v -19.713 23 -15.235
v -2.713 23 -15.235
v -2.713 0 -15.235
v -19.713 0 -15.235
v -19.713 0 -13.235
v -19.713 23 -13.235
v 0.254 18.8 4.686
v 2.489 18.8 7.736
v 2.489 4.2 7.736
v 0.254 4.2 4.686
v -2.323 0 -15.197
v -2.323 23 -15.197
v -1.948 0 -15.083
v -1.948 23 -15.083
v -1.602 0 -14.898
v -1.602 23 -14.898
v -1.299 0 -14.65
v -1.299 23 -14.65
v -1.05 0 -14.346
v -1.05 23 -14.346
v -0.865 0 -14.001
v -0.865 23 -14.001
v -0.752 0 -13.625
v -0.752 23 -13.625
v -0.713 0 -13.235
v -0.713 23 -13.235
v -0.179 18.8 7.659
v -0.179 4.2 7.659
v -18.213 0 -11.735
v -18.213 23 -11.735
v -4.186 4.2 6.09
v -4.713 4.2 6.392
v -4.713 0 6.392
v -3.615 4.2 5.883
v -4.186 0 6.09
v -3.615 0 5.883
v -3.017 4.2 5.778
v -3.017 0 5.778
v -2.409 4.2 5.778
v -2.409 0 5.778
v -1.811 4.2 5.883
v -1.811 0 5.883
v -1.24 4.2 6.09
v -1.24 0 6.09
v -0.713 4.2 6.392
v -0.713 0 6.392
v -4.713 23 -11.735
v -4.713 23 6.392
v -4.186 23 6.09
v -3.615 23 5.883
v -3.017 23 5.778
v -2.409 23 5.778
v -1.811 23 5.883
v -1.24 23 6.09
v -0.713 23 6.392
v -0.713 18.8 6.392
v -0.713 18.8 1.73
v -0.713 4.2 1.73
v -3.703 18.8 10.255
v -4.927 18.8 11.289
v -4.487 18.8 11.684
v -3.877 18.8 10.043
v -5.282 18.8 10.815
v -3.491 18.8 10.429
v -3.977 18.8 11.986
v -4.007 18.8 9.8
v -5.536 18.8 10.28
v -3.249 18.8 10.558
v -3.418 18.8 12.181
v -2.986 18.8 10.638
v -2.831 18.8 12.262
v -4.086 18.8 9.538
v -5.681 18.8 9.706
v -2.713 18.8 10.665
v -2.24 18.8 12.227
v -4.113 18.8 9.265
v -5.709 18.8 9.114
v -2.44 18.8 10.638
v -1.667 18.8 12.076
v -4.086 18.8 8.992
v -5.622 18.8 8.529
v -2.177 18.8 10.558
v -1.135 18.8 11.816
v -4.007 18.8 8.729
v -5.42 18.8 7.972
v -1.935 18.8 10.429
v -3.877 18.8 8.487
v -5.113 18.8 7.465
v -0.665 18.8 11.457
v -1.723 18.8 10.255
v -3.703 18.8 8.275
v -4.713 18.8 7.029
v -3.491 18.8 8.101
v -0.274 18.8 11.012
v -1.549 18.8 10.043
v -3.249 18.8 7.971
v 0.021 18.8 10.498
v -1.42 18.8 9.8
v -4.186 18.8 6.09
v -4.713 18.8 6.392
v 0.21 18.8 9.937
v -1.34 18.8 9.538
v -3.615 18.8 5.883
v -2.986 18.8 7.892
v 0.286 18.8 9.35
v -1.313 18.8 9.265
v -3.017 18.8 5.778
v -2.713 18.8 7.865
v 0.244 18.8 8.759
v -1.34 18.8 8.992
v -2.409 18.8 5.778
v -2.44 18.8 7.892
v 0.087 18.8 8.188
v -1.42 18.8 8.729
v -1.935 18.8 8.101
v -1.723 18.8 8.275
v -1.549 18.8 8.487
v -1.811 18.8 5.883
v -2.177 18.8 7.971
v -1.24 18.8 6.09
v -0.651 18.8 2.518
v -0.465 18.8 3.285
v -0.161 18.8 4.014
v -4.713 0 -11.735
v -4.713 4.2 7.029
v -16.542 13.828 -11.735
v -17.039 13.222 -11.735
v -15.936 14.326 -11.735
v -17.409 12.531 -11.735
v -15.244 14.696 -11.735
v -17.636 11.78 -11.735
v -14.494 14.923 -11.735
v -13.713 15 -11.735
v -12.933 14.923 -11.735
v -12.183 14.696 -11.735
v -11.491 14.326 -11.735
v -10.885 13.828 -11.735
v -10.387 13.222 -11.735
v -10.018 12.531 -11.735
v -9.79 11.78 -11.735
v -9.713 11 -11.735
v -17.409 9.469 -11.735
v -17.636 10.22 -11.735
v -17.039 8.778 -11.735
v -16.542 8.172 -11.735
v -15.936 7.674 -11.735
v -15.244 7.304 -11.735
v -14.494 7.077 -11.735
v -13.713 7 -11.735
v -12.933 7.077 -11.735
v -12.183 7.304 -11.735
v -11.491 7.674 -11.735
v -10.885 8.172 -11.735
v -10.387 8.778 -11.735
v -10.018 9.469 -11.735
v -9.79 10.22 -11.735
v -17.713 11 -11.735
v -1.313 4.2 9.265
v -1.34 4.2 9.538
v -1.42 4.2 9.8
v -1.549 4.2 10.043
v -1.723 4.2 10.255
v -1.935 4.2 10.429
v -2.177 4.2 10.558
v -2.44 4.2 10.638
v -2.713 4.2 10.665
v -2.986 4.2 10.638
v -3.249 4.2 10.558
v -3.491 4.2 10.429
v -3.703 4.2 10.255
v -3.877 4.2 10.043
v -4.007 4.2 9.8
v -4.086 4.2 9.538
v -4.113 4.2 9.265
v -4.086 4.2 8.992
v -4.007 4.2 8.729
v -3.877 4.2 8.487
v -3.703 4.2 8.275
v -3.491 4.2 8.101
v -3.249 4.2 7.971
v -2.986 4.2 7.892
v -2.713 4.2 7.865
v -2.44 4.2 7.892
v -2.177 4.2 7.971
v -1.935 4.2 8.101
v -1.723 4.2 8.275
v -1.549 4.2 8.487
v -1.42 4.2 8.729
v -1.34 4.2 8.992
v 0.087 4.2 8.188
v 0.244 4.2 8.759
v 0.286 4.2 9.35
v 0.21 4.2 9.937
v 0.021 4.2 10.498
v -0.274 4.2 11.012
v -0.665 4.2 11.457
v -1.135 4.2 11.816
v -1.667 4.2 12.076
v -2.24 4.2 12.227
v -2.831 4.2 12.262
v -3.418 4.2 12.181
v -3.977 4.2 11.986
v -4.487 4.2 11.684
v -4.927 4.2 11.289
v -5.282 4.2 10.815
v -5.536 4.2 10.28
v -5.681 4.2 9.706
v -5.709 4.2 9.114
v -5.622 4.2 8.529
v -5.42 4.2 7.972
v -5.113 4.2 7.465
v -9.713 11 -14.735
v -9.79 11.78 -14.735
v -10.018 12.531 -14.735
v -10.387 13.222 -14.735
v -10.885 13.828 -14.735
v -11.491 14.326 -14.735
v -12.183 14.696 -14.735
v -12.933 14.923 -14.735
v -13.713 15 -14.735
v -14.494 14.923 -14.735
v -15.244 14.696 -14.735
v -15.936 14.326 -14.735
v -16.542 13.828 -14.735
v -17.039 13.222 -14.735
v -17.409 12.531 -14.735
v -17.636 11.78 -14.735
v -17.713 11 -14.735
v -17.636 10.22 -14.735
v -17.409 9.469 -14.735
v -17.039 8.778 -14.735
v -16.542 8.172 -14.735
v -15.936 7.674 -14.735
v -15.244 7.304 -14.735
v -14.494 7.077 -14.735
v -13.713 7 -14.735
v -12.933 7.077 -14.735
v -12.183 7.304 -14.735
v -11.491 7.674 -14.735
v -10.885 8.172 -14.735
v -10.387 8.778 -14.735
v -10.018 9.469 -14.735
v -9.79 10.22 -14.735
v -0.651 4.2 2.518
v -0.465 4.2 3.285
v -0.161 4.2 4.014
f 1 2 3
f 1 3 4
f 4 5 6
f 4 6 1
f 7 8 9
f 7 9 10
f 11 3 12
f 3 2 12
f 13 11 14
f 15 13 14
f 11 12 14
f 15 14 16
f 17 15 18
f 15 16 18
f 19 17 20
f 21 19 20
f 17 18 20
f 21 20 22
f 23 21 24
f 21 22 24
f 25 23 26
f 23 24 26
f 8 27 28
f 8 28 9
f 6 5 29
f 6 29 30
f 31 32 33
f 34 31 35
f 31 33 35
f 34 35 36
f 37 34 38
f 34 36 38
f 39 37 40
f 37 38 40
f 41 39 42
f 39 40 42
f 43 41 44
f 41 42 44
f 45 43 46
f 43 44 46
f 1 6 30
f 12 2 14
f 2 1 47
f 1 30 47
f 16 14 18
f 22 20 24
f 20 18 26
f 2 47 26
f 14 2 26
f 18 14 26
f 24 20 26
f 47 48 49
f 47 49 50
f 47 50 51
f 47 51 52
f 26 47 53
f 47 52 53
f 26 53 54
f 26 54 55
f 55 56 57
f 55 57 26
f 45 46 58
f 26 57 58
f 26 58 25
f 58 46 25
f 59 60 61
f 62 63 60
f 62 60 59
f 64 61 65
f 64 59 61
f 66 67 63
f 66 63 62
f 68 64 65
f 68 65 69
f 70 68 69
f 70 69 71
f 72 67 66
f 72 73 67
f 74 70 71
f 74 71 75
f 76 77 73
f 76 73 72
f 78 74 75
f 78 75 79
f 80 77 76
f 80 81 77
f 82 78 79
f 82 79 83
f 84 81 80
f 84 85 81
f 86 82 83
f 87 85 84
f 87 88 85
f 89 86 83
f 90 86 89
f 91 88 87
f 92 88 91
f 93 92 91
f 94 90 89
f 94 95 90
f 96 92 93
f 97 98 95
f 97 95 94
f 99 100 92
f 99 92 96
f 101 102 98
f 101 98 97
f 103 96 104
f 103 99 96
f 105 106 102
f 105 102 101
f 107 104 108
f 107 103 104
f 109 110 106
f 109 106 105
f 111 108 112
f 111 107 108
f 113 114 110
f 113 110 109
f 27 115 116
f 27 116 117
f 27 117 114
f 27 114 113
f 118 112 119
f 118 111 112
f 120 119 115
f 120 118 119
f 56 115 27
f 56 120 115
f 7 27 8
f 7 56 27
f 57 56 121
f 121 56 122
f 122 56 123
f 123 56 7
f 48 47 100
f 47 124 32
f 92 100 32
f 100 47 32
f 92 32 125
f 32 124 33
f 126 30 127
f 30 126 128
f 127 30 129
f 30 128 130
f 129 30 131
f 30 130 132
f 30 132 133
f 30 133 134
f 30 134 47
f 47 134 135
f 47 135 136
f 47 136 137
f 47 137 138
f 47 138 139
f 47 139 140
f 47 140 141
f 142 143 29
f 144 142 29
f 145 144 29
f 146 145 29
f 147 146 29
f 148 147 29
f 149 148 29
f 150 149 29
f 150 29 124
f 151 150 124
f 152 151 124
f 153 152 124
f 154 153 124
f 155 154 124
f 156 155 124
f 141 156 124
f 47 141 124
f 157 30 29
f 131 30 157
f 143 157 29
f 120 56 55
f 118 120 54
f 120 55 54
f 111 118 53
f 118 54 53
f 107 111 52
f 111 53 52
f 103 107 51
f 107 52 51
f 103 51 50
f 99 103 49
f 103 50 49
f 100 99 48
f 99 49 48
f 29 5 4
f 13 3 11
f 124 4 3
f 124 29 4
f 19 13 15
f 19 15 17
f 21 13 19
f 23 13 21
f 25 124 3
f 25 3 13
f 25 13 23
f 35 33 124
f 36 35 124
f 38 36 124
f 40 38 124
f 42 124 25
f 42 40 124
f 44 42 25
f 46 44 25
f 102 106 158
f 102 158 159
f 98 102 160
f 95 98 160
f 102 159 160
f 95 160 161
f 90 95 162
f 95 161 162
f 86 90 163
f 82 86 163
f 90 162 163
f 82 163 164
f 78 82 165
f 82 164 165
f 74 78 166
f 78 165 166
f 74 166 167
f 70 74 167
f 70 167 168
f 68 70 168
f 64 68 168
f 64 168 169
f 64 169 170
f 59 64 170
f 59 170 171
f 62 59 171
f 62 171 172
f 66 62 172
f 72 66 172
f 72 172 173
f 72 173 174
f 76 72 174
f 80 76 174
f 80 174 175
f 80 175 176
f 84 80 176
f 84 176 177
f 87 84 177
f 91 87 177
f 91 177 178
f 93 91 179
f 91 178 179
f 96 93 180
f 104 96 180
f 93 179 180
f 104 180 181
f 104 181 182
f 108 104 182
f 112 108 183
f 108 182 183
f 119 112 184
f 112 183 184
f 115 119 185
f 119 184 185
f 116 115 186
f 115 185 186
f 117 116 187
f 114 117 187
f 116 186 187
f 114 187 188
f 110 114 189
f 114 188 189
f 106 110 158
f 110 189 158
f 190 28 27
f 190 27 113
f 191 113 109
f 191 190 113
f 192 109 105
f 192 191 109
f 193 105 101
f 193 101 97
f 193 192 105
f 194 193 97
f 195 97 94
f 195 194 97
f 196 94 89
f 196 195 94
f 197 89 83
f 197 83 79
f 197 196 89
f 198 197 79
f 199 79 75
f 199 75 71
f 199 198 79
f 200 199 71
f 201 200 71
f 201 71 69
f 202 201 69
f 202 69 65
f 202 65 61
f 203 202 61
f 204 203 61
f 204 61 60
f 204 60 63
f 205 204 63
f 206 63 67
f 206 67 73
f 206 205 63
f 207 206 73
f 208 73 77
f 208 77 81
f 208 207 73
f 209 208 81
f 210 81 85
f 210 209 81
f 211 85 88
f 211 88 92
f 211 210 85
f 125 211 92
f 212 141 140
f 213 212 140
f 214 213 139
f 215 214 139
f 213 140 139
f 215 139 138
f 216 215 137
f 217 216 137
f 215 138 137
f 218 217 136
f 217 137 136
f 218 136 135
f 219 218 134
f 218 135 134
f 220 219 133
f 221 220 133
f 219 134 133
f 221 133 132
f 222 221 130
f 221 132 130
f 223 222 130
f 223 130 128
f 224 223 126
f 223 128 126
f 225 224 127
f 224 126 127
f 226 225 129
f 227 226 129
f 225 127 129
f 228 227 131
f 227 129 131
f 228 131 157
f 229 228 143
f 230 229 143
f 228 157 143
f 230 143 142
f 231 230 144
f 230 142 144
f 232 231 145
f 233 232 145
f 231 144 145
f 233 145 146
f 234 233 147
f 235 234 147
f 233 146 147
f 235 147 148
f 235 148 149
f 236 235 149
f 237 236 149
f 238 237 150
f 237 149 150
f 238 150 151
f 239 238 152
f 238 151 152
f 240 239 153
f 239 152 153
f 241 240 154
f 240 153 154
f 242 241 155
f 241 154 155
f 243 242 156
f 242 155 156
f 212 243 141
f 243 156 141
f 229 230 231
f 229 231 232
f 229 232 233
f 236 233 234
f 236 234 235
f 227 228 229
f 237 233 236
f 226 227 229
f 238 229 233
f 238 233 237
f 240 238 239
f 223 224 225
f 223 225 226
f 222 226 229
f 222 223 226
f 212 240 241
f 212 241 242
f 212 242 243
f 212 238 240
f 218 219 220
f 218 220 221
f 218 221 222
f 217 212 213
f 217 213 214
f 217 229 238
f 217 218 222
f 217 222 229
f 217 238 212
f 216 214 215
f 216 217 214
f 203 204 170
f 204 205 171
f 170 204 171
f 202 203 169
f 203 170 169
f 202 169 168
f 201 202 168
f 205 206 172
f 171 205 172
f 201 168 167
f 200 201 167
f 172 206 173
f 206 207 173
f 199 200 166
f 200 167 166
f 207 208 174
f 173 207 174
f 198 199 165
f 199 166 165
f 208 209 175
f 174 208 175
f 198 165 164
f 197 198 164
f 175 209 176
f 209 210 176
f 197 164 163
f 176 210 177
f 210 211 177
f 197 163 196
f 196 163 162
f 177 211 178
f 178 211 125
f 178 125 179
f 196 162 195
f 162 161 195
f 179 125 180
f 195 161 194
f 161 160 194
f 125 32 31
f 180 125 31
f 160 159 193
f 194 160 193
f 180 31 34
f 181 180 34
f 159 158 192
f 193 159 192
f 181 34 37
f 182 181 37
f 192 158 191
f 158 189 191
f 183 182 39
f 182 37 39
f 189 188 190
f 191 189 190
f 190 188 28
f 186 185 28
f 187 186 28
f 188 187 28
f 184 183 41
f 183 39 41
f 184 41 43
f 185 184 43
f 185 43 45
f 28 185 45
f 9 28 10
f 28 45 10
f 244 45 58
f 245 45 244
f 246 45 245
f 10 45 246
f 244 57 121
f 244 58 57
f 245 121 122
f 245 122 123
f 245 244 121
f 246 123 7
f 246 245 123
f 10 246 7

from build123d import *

# Parameters (mm, degrees)
SKETCH1_W           = 15
SKETCH1_H           = 3.5
BOSS_EXTRUDE1_DEPTH = 23
SKETCH3_R           = 3
BOSS_EXTRUDE2_DEPTH = 23
SKETCH4_R           = 1.4
CUT_EXTRUDE1_DEPTH  = 23
SKETCH5_R           = 3.5
CUT_EXTRUDE2_DEPTH  = 4.2
SKETCH6_R           = 3.5
CUT_EXTRUDE3_DEPTH  = 4.2
SKETCH7_R           = 4
CUT_EXTRUDE4_DEPTH  = 3
CHAMFER1_SIZE       = 1.5
BOSS_EXTRUDE3_DEPTH = 14.6
FILLET1_R           = 2
FILLET2_R           = 5


with BuildPart() as part:
    # Sketch1 → Boss-Extrude1 (new body)
    with BuildSketch(Plane(origin=(0, 0, 0), x_dir=(1, 0, 0), z_dir=(0, 1, 0))):
        with Locations((-12.213235294, 13.485294118)):
            Rectangle(SKETCH1_W, SKETCH1_H)
        Polygon((-0.713235294, 15.235294118), (-4.713235294, 15.235294118), (-4.713235294, 11.735294118), (-4.713235294, -9.264705882), (-0.713235294, -9.264705882), align=None)
    extrude(amount=BOSS_EXTRUDE1_DEPTH)

    # Sketch3 → Boss-Extrude2 (add)
    with BuildSketch(Plane.XZ):
        with Locations((-2.713235294, 9.264705882)):
            Circle(SKETCH3_R)
    extrude(amount=-BOSS_EXTRUDE2_DEPTH)

    # Sketch4 → Cut-Extrude1 (cut)
    with BuildSketch(Plane.XZ):
        with Locations((-2.713235294, 9.264705882)):
            Circle(SKETCH4_R)
    extrude(amount=-CUT_EXTRUDE1_DEPTH, mode=Mode.SUBTRACT)

    # Sketch5 → Cut-Extrude2 (cut)
    with BuildSketch(Plane.XZ):
        with Locations((-2.713235294, 9.264705882)):
            Circle(SKETCH5_R)
    extrude(amount=-CUT_EXTRUDE2_DEPTH, mode=Mode.SUBTRACT)

    # Sketch6 → Cut-Extrude3 (cut)
    with BuildSketch(Plane(origin=(0, 23, 0), x_dir=(1, 0, 0), z_dir=(0, 1, 0))):
        with Locations((-2.713235294, -9.264705882)):
            Circle(SKETCH6_R)
    extrude(amount=-CUT_EXTRUDE3_DEPTH, mode=Mode.SUBTRACT)

    # Sketch7 → Cut-Extrude4 (cut)
    with BuildSketch(Plane.XY.offset(-11.735294118)):
        with Locations((-13.713235294, 11)):
            Circle(SKETCH7_R)
    extrude(amount=-CUT_EXTRUDE4_DEPTH, mode=Mode.SUBTRACT)

    # Chamfer1
    chamfer1_edges = [part.edges().sort_by_distance(p)[0] for p in [
        (-19.713235294, 11.5, -11.735294118),
    ]]
    chamfer(chamfer1_edges, length=CHAMFER1_SIZE)

    # Sketch8 → Boss-Extrude3 (add)
    with BuildSketch(Plane(origin=(0, 18.8, 0), x_dir=(1, 0, 0), z_dir=(0, 1, 0))):
        Polygon((-0.92234324, -7.637497627), (2.489493511, -7.736371955), (-0.92234324, -3.081041661), align=None)
    extrude(amount=-BOSS_EXTRUDE3_DEPTH)

    # Fillet1
    fillet1_edges = [part.edges().sort_by_distance(p)[0] for p in [
        (-0.713235294, 11.5, -15.235294118),
    ]]
    fillet(fillet1_edges, radius=FILLET1_R)

    # Fillet2
    fillet2_edges = [part.edges().sort_by_distance(p)[0] for p in [
        (-0.713235294, 11.5, 3.36636204),
    ]]
    fillet(fillet2_edges, radius=FILLET2_R)


solid = part.part
